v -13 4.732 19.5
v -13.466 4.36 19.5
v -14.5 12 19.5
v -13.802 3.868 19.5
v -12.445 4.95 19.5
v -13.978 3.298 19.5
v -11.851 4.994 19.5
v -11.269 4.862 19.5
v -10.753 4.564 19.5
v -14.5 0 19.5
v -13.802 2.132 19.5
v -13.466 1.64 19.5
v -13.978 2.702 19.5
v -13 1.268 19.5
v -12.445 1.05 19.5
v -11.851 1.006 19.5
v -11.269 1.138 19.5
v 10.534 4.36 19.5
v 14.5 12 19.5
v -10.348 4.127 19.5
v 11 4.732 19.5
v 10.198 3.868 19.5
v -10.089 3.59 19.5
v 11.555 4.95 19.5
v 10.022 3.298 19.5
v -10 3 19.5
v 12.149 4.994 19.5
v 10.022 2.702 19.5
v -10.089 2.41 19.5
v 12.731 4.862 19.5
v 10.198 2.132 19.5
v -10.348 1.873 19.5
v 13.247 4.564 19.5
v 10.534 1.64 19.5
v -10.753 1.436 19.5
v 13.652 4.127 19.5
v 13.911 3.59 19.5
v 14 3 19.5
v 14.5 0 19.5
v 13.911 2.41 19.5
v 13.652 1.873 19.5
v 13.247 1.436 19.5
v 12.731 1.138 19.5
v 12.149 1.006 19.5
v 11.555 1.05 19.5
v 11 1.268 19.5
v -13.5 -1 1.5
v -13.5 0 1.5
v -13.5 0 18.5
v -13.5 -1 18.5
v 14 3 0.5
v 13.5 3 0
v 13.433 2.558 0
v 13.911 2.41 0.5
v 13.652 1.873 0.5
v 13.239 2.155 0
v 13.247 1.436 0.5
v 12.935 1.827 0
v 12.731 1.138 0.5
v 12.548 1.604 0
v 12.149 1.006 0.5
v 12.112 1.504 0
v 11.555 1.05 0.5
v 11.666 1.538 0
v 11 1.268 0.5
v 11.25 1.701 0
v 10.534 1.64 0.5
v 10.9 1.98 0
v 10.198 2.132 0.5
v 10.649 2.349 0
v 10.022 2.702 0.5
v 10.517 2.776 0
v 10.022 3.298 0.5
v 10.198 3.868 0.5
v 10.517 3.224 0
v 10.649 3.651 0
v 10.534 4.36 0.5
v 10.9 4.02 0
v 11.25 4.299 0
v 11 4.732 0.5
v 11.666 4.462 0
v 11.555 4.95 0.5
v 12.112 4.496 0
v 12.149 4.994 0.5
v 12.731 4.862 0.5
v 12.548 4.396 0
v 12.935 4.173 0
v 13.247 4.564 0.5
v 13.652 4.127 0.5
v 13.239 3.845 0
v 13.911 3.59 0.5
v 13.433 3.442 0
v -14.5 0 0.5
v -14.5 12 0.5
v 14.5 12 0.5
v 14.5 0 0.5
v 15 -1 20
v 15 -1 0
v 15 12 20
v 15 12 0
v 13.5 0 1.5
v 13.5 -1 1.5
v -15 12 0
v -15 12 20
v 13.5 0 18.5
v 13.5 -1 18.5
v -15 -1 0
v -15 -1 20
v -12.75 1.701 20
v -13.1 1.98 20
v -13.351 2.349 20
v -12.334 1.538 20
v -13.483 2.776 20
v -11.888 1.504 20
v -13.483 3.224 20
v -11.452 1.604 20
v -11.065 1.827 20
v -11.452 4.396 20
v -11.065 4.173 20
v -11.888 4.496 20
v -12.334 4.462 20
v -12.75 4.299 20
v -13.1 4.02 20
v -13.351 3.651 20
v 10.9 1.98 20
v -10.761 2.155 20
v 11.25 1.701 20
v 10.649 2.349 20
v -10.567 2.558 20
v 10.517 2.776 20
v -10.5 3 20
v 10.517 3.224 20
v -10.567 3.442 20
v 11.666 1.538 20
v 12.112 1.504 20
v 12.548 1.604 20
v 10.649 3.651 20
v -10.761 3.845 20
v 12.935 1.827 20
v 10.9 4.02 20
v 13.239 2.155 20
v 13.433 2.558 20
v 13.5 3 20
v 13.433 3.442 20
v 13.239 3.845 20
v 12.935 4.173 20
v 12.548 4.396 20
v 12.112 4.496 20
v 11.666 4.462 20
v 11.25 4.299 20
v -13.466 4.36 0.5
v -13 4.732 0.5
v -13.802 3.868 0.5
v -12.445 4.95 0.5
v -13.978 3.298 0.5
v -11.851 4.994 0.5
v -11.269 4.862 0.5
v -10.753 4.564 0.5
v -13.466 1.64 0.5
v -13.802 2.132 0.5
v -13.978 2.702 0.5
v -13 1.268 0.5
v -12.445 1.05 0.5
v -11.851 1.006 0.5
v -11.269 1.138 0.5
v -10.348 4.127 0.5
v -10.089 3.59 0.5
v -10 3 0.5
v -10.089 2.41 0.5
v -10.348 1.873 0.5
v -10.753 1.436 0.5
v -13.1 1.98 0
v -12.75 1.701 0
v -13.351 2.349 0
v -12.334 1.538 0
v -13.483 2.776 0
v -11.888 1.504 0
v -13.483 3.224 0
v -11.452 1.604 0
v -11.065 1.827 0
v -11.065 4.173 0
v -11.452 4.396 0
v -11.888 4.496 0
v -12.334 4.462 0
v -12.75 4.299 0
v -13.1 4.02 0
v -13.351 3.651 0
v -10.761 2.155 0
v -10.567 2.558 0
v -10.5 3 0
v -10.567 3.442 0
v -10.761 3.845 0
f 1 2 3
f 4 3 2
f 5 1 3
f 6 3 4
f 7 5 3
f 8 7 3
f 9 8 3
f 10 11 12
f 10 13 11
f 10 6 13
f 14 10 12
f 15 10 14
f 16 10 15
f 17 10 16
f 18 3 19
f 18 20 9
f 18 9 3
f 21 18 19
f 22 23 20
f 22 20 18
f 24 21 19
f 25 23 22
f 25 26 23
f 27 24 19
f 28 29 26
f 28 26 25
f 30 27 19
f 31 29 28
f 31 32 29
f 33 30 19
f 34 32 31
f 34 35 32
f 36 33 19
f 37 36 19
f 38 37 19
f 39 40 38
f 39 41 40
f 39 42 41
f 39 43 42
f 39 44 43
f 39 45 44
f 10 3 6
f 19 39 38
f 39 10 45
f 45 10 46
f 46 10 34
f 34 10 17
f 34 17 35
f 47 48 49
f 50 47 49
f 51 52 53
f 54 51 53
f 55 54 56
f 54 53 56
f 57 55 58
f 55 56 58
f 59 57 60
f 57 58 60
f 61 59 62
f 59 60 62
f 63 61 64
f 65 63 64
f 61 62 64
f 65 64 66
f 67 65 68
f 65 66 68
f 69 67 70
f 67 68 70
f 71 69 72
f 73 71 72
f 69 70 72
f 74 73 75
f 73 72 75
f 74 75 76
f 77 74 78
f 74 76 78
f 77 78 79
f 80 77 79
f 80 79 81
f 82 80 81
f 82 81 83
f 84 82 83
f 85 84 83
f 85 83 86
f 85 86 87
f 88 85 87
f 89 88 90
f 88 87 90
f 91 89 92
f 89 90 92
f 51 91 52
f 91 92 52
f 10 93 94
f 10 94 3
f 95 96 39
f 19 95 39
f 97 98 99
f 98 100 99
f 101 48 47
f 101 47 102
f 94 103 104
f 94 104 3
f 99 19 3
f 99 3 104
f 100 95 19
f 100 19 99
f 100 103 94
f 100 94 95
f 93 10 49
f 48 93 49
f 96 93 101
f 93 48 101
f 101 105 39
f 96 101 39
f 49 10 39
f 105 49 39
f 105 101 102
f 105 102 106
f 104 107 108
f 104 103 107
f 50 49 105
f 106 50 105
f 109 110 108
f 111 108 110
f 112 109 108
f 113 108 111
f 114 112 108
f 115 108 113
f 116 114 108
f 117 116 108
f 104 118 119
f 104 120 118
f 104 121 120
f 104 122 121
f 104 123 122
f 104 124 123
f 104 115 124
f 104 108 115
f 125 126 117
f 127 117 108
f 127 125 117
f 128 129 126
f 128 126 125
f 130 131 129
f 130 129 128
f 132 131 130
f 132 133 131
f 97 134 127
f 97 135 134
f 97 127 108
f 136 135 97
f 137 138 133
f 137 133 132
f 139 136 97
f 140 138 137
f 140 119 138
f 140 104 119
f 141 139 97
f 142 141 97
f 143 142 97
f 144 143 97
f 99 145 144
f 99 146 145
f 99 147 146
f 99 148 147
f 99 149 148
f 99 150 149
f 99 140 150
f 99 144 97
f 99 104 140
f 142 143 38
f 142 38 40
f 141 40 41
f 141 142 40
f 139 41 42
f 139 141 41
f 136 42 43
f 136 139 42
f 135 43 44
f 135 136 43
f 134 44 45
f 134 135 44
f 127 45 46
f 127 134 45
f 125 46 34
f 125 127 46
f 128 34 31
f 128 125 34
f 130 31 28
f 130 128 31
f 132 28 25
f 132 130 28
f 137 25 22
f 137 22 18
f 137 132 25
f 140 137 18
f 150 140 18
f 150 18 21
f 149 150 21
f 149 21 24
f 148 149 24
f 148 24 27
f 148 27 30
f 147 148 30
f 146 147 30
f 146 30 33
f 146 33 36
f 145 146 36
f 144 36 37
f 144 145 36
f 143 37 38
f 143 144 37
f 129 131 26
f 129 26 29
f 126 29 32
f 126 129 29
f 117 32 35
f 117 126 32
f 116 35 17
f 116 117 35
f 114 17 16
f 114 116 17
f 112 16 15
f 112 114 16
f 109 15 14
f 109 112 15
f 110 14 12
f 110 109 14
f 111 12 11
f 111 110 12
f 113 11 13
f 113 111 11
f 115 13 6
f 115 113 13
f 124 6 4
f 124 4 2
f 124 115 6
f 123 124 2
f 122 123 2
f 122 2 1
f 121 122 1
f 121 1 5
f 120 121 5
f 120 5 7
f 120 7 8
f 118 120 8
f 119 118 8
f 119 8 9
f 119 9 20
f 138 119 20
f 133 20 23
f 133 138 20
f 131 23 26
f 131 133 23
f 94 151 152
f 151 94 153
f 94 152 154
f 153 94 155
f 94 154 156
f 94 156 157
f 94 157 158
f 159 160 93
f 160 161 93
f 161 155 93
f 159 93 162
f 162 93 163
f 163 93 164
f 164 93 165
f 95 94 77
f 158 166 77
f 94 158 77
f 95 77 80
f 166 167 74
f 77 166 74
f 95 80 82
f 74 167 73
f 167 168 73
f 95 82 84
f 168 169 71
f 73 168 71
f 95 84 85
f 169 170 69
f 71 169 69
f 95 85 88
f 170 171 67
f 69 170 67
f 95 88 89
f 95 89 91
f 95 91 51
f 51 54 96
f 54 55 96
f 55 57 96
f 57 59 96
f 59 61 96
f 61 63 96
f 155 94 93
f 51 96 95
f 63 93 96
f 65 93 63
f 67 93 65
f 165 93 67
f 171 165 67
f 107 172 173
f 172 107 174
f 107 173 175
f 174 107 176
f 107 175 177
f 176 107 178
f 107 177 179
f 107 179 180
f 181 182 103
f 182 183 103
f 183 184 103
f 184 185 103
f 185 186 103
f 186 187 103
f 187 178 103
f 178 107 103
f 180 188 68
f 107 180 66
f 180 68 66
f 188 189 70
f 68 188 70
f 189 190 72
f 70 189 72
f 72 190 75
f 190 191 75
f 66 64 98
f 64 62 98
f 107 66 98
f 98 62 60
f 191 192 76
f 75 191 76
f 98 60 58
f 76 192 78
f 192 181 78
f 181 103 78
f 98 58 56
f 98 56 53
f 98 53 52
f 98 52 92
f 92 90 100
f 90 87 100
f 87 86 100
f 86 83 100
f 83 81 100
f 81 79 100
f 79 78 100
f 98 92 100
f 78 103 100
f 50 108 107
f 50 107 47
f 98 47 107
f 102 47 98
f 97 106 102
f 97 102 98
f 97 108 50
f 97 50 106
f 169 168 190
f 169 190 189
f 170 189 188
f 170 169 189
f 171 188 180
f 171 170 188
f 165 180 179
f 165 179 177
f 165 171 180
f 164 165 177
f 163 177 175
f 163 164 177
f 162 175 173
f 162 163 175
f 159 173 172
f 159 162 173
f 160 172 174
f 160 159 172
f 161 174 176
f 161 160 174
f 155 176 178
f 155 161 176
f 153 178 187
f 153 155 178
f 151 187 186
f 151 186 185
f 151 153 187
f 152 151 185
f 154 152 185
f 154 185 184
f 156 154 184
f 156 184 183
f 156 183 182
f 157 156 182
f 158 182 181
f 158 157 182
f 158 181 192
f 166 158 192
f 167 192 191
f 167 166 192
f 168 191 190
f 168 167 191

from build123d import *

# Parameters (mm, degrees)
F0_W     = 30
F0_H     = 12
F0_R     = 1.5
F1_DEPTH = 20
F2_W     = 29
F2_H     = 19
F2_W_2   = 27
F2_H_2   = 17
F3_DEPTH = 12
F2_W_3   = 30
F2_H_3   = 20
F4_DEPTH = 1
F5_SIZE2 = 0.49999
F5_SIZE  = 0.49999


# Not quite as in the source:
# - a fillet or chamfer is up to 0.001 mm smaller than in the source, because OpenCascade refuses the exact size


with BuildPart() as f1:
    # F0 (on Top) → F1 (new body)
    with BuildSketch(Plane.XY):
        with Locations((0, 6)):
            Rectangle(F0_W, F0_H)
        with Locations((-12, 3)):
            Circle(F0_R, mode=Mode.SUBTRACT)
        with Locations((12, 3)):
            Circle(F0_R, mode=Mode.SUBTRACT)
    extrude(amount=F1_DEPTH)

    # F2 (on Front) → F3 (cut)
    with BuildSketch(Plane.XZ):
        with Locations((0, 10)):
            Rectangle(F2_W, F2_H)
        with Locations((0, 10)):
            Rectangle(F2_W_2, F2_H_2, mode=Mode.SUBTRACT)
        with Locations((0, 10)):
            Rectangle(F2_W_2, F2_H_2)
    extrude(amount=-F3_DEPTH, mode=Mode.SUBTRACT)

    # F2 (on Front) → F4 (join)
    with BuildSketch(Plane.XZ):
        with Locations((0, 10)):
            Rectangle(F2_W_3, F2_H_3)
        with Locations((0, 10)):
            Rectangle(F2_W, F2_H, mode=Mode.SUBTRACT)
        with Locations((0, 10)):
            Rectangle(F2_W, F2_H)
        with Locations((0, 10)):
            Rectangle(F2_W_2, F2_H_2, mode=Mode.SUBTRACT)
    extrude(amount=F4_DEPTH)

    # F5 (size 0.5 and 0.5 in the source; OpenCascade refuses exactly that, so slightly less here)
    f5_edges = [f1.edges().sort_by_distance(p)[0] for p in [
        (-13.5, 3, 0.5),
        (10.5, 3, 0.5),
        (10.5, 3, 19.5),
        (-13.5, 3, 19.5),
    ]]
    chamfer(f5_edges, length=F5_SIZE, length2=F5_SIZE2)


solid = f1.part
